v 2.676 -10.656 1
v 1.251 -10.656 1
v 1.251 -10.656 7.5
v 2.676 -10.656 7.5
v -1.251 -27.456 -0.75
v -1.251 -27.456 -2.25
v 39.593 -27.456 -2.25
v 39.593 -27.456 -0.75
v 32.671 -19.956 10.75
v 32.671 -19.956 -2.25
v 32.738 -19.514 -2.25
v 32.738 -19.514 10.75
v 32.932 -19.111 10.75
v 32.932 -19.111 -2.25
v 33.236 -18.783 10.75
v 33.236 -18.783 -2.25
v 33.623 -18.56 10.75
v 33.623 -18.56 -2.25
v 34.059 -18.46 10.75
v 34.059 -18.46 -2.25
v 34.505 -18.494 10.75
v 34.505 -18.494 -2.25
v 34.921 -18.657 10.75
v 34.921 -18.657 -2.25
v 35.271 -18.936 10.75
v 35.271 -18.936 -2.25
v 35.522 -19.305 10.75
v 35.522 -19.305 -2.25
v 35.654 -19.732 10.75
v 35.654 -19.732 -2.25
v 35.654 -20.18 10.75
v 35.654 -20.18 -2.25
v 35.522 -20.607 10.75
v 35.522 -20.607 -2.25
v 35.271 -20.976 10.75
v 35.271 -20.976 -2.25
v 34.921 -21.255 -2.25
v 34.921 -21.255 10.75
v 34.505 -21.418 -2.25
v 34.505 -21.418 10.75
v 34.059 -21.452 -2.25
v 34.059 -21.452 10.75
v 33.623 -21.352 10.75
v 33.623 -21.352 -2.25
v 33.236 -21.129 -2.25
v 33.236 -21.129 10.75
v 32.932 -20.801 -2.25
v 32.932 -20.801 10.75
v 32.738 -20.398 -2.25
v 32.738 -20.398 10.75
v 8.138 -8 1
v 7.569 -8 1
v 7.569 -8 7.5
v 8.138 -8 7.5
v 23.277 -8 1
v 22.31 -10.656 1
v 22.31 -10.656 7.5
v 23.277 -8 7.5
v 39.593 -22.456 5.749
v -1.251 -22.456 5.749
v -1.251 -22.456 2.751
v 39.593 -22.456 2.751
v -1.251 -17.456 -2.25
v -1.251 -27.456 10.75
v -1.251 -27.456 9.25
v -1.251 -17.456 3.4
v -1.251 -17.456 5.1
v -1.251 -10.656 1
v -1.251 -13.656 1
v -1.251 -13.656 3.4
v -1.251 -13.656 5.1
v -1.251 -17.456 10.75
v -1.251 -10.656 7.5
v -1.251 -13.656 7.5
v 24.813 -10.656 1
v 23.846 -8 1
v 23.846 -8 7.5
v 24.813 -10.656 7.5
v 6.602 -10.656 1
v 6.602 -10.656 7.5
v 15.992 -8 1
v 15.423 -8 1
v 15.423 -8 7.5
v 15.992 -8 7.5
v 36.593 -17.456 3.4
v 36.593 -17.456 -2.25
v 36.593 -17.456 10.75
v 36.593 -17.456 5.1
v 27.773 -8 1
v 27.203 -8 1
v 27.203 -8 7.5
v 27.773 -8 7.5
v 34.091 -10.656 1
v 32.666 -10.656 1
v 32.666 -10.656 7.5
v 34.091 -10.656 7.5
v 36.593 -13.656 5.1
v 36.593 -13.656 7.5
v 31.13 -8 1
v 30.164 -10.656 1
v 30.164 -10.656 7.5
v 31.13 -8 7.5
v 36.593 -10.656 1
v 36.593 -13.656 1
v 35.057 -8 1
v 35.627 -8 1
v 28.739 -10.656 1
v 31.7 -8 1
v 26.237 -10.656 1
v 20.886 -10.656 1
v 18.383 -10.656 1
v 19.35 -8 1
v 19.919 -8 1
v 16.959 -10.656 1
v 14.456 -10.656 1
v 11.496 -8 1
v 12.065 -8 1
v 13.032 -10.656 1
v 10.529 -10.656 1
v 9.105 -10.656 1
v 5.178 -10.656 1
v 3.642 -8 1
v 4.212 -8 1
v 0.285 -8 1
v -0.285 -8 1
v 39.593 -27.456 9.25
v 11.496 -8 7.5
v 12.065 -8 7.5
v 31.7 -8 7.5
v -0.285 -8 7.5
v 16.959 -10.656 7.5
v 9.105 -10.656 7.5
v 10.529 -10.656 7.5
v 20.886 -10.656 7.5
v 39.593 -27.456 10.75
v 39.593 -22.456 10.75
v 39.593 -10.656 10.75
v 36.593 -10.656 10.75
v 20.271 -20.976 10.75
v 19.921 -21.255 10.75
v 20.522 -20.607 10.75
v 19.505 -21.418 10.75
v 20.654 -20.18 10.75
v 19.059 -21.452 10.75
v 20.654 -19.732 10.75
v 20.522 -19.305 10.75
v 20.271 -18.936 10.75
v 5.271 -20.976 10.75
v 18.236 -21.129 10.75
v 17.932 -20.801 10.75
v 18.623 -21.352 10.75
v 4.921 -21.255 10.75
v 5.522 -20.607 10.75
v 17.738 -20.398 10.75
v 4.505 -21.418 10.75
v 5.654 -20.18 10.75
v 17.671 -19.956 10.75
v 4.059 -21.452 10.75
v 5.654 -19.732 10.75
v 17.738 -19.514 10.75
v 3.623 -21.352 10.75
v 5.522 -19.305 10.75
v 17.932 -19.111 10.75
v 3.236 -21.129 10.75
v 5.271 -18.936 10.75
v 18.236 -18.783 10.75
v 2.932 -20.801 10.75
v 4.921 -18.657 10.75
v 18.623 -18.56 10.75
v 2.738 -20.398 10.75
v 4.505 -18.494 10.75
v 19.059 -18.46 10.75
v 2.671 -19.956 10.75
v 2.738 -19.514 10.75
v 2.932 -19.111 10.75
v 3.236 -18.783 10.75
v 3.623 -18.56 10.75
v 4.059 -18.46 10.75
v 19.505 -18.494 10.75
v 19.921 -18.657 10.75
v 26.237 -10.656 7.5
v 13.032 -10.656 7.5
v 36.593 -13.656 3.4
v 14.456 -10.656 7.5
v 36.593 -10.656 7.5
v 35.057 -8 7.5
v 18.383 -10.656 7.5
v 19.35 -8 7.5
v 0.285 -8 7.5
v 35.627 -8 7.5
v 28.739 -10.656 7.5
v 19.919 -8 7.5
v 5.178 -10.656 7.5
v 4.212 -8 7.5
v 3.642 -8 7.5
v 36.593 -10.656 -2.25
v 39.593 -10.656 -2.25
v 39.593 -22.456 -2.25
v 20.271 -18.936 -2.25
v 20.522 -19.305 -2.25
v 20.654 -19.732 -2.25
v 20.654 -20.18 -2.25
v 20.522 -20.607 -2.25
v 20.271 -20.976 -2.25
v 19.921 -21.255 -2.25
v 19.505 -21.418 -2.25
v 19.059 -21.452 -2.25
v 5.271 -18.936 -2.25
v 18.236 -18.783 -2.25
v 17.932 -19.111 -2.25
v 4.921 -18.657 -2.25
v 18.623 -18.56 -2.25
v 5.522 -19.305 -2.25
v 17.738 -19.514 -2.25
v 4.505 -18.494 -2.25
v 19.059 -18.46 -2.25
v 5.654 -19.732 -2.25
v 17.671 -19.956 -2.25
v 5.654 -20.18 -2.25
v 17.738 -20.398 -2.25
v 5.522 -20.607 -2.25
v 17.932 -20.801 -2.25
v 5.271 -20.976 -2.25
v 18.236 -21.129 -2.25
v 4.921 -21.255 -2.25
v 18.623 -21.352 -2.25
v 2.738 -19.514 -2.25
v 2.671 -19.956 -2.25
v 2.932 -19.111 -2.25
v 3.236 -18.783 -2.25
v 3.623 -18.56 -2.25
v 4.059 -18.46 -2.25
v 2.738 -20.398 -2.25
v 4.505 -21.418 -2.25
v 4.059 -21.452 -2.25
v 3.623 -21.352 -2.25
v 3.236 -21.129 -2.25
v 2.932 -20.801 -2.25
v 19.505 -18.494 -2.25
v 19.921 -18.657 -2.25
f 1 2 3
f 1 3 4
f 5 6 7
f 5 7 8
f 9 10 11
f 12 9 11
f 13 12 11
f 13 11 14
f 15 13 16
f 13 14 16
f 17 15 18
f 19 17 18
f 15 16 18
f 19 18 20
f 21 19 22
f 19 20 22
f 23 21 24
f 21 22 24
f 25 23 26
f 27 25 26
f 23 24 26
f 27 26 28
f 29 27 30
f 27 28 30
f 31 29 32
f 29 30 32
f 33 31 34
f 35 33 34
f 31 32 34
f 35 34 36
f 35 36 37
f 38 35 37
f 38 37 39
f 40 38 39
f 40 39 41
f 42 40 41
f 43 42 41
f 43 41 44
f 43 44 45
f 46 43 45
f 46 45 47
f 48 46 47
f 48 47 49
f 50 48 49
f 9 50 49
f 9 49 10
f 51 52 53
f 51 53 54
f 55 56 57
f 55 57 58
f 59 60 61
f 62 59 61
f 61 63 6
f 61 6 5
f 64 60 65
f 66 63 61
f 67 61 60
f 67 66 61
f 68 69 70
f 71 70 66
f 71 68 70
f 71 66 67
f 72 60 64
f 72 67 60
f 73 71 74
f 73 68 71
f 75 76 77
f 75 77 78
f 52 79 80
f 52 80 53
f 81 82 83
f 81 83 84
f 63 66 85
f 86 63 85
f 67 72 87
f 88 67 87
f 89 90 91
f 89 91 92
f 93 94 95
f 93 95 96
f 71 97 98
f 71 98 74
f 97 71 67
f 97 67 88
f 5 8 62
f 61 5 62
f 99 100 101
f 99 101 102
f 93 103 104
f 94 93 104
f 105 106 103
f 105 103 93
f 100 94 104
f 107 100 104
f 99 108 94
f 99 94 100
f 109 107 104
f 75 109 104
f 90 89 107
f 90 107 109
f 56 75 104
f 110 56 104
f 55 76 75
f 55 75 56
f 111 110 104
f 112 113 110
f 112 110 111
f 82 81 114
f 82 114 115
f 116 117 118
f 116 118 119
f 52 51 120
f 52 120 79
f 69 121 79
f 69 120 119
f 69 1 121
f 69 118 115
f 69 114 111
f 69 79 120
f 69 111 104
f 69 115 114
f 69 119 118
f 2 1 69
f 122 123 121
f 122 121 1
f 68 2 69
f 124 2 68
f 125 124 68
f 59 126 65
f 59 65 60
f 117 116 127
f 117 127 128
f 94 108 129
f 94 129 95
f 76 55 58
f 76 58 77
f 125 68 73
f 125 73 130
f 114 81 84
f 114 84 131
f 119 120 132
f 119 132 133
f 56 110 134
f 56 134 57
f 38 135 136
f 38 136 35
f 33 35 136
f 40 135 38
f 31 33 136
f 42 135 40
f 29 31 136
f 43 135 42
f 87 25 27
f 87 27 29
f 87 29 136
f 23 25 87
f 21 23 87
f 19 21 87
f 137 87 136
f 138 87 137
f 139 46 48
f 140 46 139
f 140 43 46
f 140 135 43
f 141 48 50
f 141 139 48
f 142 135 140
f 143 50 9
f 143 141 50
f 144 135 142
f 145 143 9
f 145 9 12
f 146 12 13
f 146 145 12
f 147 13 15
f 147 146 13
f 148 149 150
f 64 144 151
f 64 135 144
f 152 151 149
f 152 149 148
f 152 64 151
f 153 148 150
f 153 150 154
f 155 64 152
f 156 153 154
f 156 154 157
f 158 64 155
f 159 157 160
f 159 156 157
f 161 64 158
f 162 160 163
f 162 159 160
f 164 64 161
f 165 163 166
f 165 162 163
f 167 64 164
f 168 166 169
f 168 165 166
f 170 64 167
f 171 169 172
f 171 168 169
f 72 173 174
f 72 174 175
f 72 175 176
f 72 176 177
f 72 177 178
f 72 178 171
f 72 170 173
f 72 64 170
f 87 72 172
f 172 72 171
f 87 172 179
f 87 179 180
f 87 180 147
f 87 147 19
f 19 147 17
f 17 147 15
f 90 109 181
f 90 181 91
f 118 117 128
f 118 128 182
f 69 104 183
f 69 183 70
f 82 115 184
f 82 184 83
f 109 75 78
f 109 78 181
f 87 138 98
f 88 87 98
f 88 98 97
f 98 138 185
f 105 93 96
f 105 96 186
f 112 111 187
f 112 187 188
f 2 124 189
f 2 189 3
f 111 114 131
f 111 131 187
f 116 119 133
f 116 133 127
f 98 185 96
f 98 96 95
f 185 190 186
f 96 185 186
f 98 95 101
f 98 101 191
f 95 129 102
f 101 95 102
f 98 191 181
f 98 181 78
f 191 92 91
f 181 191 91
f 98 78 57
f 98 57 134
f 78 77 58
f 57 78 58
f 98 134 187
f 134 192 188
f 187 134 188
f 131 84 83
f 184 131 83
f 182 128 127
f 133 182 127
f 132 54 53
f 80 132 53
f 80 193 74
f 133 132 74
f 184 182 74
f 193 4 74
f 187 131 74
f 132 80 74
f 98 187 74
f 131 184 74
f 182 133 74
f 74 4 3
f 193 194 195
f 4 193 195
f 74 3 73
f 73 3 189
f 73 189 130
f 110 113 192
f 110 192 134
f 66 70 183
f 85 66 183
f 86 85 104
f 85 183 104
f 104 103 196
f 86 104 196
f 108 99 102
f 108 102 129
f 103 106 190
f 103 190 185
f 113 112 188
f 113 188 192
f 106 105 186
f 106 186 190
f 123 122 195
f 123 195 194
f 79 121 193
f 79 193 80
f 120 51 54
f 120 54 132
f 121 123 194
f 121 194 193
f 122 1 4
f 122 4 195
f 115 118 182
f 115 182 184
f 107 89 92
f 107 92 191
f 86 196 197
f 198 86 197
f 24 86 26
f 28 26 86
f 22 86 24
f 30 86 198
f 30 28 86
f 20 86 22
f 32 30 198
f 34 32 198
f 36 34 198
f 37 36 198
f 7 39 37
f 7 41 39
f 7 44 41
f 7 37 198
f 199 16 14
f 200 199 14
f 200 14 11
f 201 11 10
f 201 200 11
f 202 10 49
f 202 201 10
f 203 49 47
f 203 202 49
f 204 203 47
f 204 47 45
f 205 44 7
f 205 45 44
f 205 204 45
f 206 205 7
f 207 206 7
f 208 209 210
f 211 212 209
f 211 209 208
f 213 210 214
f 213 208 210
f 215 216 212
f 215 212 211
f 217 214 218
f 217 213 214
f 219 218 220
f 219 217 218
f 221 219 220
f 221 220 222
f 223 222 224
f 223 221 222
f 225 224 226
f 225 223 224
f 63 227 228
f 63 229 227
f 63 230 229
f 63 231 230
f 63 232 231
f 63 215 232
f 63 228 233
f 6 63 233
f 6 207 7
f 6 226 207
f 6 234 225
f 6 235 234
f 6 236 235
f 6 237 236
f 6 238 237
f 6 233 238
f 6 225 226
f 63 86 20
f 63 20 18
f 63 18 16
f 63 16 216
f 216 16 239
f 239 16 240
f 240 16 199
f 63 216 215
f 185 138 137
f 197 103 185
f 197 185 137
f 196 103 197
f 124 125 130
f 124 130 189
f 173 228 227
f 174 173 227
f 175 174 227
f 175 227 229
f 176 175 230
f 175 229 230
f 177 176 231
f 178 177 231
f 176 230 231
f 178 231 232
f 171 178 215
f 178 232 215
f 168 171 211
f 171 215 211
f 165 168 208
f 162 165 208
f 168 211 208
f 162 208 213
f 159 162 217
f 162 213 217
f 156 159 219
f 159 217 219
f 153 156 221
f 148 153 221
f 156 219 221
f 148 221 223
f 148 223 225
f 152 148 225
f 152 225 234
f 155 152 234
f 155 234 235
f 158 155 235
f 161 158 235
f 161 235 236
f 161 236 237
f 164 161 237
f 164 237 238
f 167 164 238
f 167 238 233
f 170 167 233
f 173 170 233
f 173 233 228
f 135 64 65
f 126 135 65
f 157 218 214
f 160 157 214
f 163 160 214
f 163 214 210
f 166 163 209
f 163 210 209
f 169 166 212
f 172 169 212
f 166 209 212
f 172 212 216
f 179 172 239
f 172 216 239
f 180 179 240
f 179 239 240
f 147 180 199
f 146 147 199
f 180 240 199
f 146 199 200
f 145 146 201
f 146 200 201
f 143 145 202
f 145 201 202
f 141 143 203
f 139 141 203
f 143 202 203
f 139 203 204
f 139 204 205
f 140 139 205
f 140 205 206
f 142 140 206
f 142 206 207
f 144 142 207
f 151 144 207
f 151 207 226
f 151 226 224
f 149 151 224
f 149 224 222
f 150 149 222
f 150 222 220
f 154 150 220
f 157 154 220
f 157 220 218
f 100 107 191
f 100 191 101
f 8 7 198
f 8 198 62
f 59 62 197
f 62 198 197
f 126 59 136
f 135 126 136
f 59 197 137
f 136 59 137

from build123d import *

# Parameters (mm, degrees)
ESQUISSE1_R             = 2.5
BOSS_EXTRU_1_DEPTH      = 1
BOSS_EXTRU_2_DEPTH      = 6.5
ESQUISSE3_R             = 14.137419556
ENL_V_MAT_EXTRU_1_DEPTH = 1
ESQUISSE4_W             = 37.844594902
ESQUISSE4_H             = 1.7
BOSS_EXTRU_3_DEPTH      = 3.8
ESQUISSE5_W             = 37.844594902
ESQUISSE5_H             = 13
BOSS_EXTRU_4_DEPTH      = 5
ESQUISSE6_W             = 13
ESQUISSE6_H             = 11.8
BOSS_EXTRU_5_DEPTH      = 3
BOSS_EXTRU_6_DEPTH      = 40.844595
ESQUISSE8_R             = 1.5
ENL_V_MAT_EXTRU_2_DEPTH = 14


with BuildPart() as part:
    # Esquisse1 → Boss.-Extru.1 (new body)
    with BuildSketch(Plane.XY):
        with BuildLine():
            ThreePointArc((-2.797532396, 7.349311298), (-3.009326841, 7.265157674), (-3.218593728, 7.174901984))
            ThreePointArc((-3.218593728, 7.174901984), (-3.518823735, 7.161602241), (-3.746621491, 7.357620412))
            ThreePointArc((-3.746621491, 7.357620412), (-4.480939546, 8.300763177), (-5.498824516, 8.927382256))
            ThreePointArc((-5.498824516, 8.927382256), (-5.825153893, 8.717958885), (-6.143516706, 8.496612707))
            ThreePointArc((-6.143516706, 8.496612707), (-5.954123878, 7.316412877), (-5.363784935, 6.277066345))
            ThreePointArc((-5.363784935, 6.277066345), (-5.269862186, 5.991595754), (-5.397042596, 5.719308987))
            ThreePointArc((-5.397042596, 5.719308987), (-5.560510951, 5.560510951), (-5.719308987, 5.397042596))
            ThreePointArc((-5.719308987, 5.397042596), (-5.991595754, 5.269862186), (-6.277066345, 5.363784935))
            ThreePointArc((-6.277066345, 5.363784935), (-7.316412877, 5.954123878), (-8.496612707, 6.143516706))
            ThreePointArc((-8.496612707, 6.143516706), (-8.717958885, 5.825153893), (-8.927382256, 5.498824516))
            ThreePointArc((-8.927382256, 5.498824516), (-8.300763177, 4.480939546), (-7.357620412, 3.746621491))
            ThreePointArc((-7.357620412, 3.746621491), (-7.161602241, 3.518823735), (-7.174901984, 3.218593728))
            ThreePointArc((-7.174901984, 3.218593728), (-7.265157674, 3.009326841), (-7.349311298, 2.797532396))
            ThreePointArc((-7.349311298, 2.797532396), (-7.552201634, 2.575833384), (-7.851884749, 2.553361824))
            ThreePointArc((-7.851884749, 2.553361824), (-9.038028671, 2.701023192), (-10.200868635, 2.424356428))
            ThreePointArc((-10.200868635, 2.424356428), (-10.283533665, 2.045522026), (-10.352134785, 1.663890139))
            ThreePointArc((-10.352134785, 1.663890139), (-9.383686529, 0.963283789), (-8.231324879, 0.645787478))
            ThreePointArc((-8.231324879, 0.645787478), (-7.963053276, 0.510342701), (-7.860447586, 0.22787675))
            ThreePointArc((-7.860447586, 0.22787675), (-7.86375, 0), (-7.860447586, -0.22787675))
            ThreePointArc((-7.860447586, -0.22787675), (-7.963053276, -0.510342701), (-8.231324879, -0.645787478))
            ThreePointArc((-8.231324879, -0.645787478), (-9.383686529, -0.963283789), (-10.352134785, -1.663890139))
            ThreePointArc((-10.352134785, -1.663890139), (-10.283533665, -2.045522026), (-10.200868635, -2.424356428))
            ThreePointArc((-10.200868635, -2.424356428), (-9.038028671, -2.701023192), (-7.851884749, -2.553361824))
            ThreePointArc((-7.851884749, -2.553361824), (-7.552201634, -2.575833384), (-7.349311298, -2.797532396))
            ThreePointArc((-7.349311298, -2.797532396), (-7.265157674, -3.009326841), (-7.174901984, -3.218593728))
            ThreePointArc((-7.174901984, -3.218593728), (-7.161602241, -3.518823735), (-7.357620412, -3.746621491))
            ThreePointArc((-7.357620412, -3.746621491), (-8.300763177, -4.480939546), (-8.927382256, -5.498824516))
            ThreePointArc((-8.927382256, -5.498824516), (-8.717958885, -5.825153893), (-8.496612707, -6.143516706))
            ThreePointArc((-8.496612707, -6.143516706), (-7.316412877, -5.954123878), (-6.277066345, -5.363784935))
            ThreePointArc((-6.277066345, -5.363784935), (-5.991595754, -5.269862186), (-5.719308987, -5.397042596))
            ThreePointArc((-5.719308987, -5.397042596), (-5.560510951, -5.560510951), (-5.397042596, -5.719308987))
            ThreePointArc((-5.397042596, -5.719308987), (-5.269862186, -5.991595754), (-5.363784935, -6.277066345))
            ThreePointArc((-5.363784935, -6.277066345), (-5.954123878, -7.316412877), (-6.143516706, -8.496612707))
            ThreePointArc((-6.143516706, -8.496612707), (-5.825153893, -8.717958885), (-5.498824516, -8.927382256))
            ThreePointArc((-5.498824516, -8.927382256), (-4.480939546, -8.300763177), (-3.746621491, -7.357620412))
            ThreePointArc((-3.746621491, -7.357620412), (-3.518823735, -7.161602241), (-3.218593728, -7.174901984))
            ThreePointArc((-3.218593728, -7.174901984), (-3.009326841, -7.265157674), (-2.797532396, -7.349311298))
            ThreePointArc((-2.797532396, -7.349311298), (-2.575833384, -7.552201634), (-2.553361824, -7.851884749))
            ThreePointArc((-2.553361824, -7.851884749), (-2.701023192, -9.038028671), (-2.424356428, -10.200868635))
            ThreePointArc((-2.424356428, -10.200868635), (-2.045522026, -10.283533665), (-1.663890139, -10.352134785))
            ThreePointArc((-1.663890139, -10.352134785), (-0.963283789, -9.383686529), (-0.645787478, -8.231324879))
            ThreePointArc((-0.645787478, -8.231324879), (-0.510342701, -7.963053276), (-0.22787675, -7.860447586))
            ThreePointArc((-0.22787675, -7.860447586), (0, -7.86375), (0.22787675, -7.860447586))
            ThreePointArc((0.22787675, -7.860447586), (0.510342701, -7.963053276), (0.645787478, -8.231324879))
            ThreePointArc((0.645787478, -8.231324879), (0.963283789, -9.383686529), (1.663890139, -10.352134785))
            ThreePointArc((1.663890139, -10.352134785), (2.045522026, -10.283533665), (2.424356428, -10.200868635))
            ThreePointArc((2.424356428, -10.200868635), (2.701023192, -9.038028671), (2.553361824, -7.851884749))
            ThreePointArc((2.553361824, -7.851884749), (2.575833384, -7.552201634), (2.797532396, -7.349311298))
            ThreePointArc((2.797532396, -7.349311298), (3.009326841, -7.265157674), (3.218593728, -7.174901984))
            ThreePointArc((3.218593728, -7.174901984), (3.518823735, -7.161602241), (3.746621491, -7.357620412))
            ThreePointArc((3.746621491, -7.357620412), (4.480939546, -8.300763177), (5.498824516, -8.927382256))
            ThreePointArc((5.498824516, -8.927382256), (5.825153893, -8.717958885), (6.143516706, -8.496612707))
            ThreePointArc((6.143516706, -8.496612707), (5.954123878, -7.316412877), (5.363784935, -6.277066345))
            ThreePointArc((5.363784935, -6.277066345), (5.269862186, -5.991595754), (5.397042596, -5.719308987))
            ThreePointArc((5.397042596, -5.719308987), (5.560510951, -5.560510951), (5.719308987, -5.397042596))
            ThreePointArc((5.719308987, -5.397042596), (5.991595754, -5.269862186), (6.277066345, -5.363784935))
            ThreePointArc((6.277066345, -5.363784935), (7.316412877, -5.954123878), (8.496612707, -6.143516706))
            ThreePointArc((8.496612707, -6.143516706), (8.717958885, -5.825153893), (8.927382256, -5.498824516))
            ThreePointArc((8.927382256, -5.498824516), (8.300763177, -4.480939546), (7.357620412, -3.746621491))
            ThreePointArc((7.357620412, -3.746621491), (7.161602241, -3.518823735), (7.174901984, -3.218593728))
            ThreePointArc((7.174901984, -3.218593728), (7.265157674, -3.009326841), (7.349311298, -2.797532396))
            ThreePointArc((7.349311298, -2.797532396), (7.552201634, -2.575833384), (7.851884749, -2.553361824))
            ThreePointArc((7.851884749, -2.553361824), (9.038028671, -2.701023192), (10.200868635, -2.424356428))
            ThreePointArc((10.200868635, -2.424356428), (10.283533665, -2.045522026), (10.352134785, -1.663890139))
            ThreePointArc((10.352134785, -1.663890139), (9.383686529, -0.963283789), (8.231324879, -0.645787478))
            ThreePointArc((8.231324879, -0.645787478), (7.963053276, -0.510342701), (7.860447586, -0.22787675))
            ThreePointArc((7.860447586, -0.22787675), (7.86375, 0), (7.860447586, 0.22787675))
            ThreePointArc((7.860447586, 0.22787675), (7.963053276, 0.510342701), (8.231324879, 0.645787478))
            ThreePointArc((8.231324879, 0.645787478), (9.383686529, 0.963283789), (10.352134785, 1.663890139))
            ThreePointArc((10.352134785, 1.663890139), (10.283533665, 2.045522026), (10.200868635, 2.424356428))
            ThreePointArc((10.200868635, 2.424356428), (9.038028671, 2.701023192), (7.851884749, 2.553361824))
            ThreePointArc((7.851884749, 2.553361824), (7.552201634, 2.575833384), (7.349311298, 2.797532396))
            ThreePointArc((7.349311298, 2.797532396), (7.265157674, 3.009326841), (7.174901984, 3.218593728))
            ThreePointArc((7.174901984, 3.218593728), (7.161602241, 3.518823735), (7.357620412, 3.746621491))
            ThreePointArc((7.357620412, 3.746621491), (8.300763177, 4.480939546), (8.927382256, 5.498824516))
            ThreePointArc((8.927382256, 5.498824516), (8.717958885, 5.825153893), (8.496612707, 6.143516706))
            ThreePointArc((8.496612707, 6.143516706), (7.316412877, 5.954123878), (6.277066345, 5.363784935))
            ThreePointArc((6.277066345, 5.363784935), (5.991595754, 5.269862186), (5.719308987, 5.397042596))
            ThreePointArc((5.719308987, 5.397042596), (5.560510951, 5.560510951), (5.397042596, 5.719308987))
            ThreePointArc((5.397042596, 5.719308987), (5.269862186, 5.991595754), (5.363784935, 6.277066345))
            ThreePointArc((5.363784935, 6.277066345), (5.954123878, 7.316412877), (6.143516706, 8.496612707))
            ThreePointArc((6.143516706, 8.496612707), (5.825153893, 8.717958885), (5.498824516, 8.927382256))
            ThreePointArc((5.498824516, 8.927382256), (4.480939546, 8.300763177), (3.746621491, 7.357620412))
            ThreePointArc((3.746621491, 7.357620412), (3.518823735, 7.161602241), (3.218593728, 7.174901984))
            ThreePointArc((3.218593728, 7.174901984), (3.009326841, 7.265157674), (2.797532396, 7.349311298))
            ThreePointArc((2.797532396, 7.349311298), (2.575833384, 7.552201634), (2.553361824, 7.851884749))
            ThreePointArc((2.553361824, 7.851884749), (2.701023192, 9.038028671), (2.424356428, 10.200868635))
            ThreePointArc((2.424356428, 10.200868635), (2.045522026, 10.283533665), (1.663890139, 10.352134785))
            ThreePointArc((1.663890139, 10.352134785), (0.963283789, 9.383686529), (0.645787478, 8.231324879))
            ThreePointArc((0.645787478, 8.231324879), (0.510342701, 7.963053276), (0.22787675, 7.860447586))
            ThreePointArc((0.22787675, 7.860447586), (0, 7.86375), (-0.22787675, 7.860447586))
            ThreePointArc((-0.22787675, 7.860447586), (-0.510342701, 7.963053276), (-0.645787478, 8.231324879))
            ThreePointArc((-0.645787478, 8.231324879), (-0.963283789, 9.383686529), (-1.663890139, 10.352134785))
            ThreePointArc((-1.663890139, 10.352134785), (-2.045522026, 10.283533665), (-2.424356428, 10.200868635))
            ThreePointArc((-2.424356428, 10.200868635), (-2.701023192, 9.038028671), (-2.553361824, 7.851884749))
            ThreePointArc((-2.553361824, 7.851884749), (-2.575833384, 7.552201634), (-2.797532396, 7.349311298))
        make_face()
        Circle(ESQUISSE1_R, mode=Mode.SUBTRACT)
    extrude(amount=BOSS_EXTRU_1_DEPTH)

    # Esquisse2 → Boss.-Extru.2 (add)
    with BuildSketch(Plane.XY.offset(1)):
        Polygon((0.284655009, -8), (1.251359951, -10.656), (2.675515049, -10.656), (3.642219991, -8), (4.211530009, -8), (5.178234951, -10.656), (6.602390049, -10.656), (7.569094991, -8), (8.138405009, -8), (9.105109951, -10.656), (10.529265049, -10.656), (11.495969991, -8), (12.065280009, -8), (13.031984951, -10.656), (14.456140049, -10.656), (15.422844991, -8), (15.992155009, -8), (16.958859951, -10.656), (18.383015049, -10.656), (19.349719991, -8), (19.919030009, -8), (20.885734951, -10.656), (22.309890049, -10.656), (23.276594991, -8), (23.845905009, -8), (24.812609951, -10.656), (26.236765049, -10.656), (27.203469991, -8), (27.772780009, -8), (28.739484951, -10.656), (30.163640049, -10.656), (31.130344991, -8), (31.699655009, -8), (32.666359951, -10.656), (34.090515049, -10.656), (35.057219991, -8), (35.626530009, -8), (36.593234951, -10.656), (36.593234951, -13.656), (-1.251359951, -13.656), (-1.251359951, -10.656), (-0.284655009, -8), align=None)
    extrude(amount=BOSS_EXTRU_2_DEPTH)

    # Esquisse3 → Enlèv. mat.-Extru.1 (cut)
    with BuildSketch(Plane(origin=(0, 0, 0), x_dir=(-1, 0, 0), z_dir=(0, 0, -1))):
        Circle(ESQUISSE3_R)
    extrude(amount=-ENL_V_MAT_EXTRU_1_DEPTH, mode=Mode.SUBTRACT)

    # Esquisse4 → Boss.-Extru.3 (add)
    with BuildSketch(Plane.XZ.offset(13.656)):
        with Locations((17.6709375, 4.25)):
            Rectangle(ESQUISSE4_W, ESQUISSE4_H)
    extrude(amount=BOSS_EXTRU_3_DEPTH)

    # Esquisse5 → Boss.-Extru.4 (add)
    with BuildSketch(Plane.XZ.offset(17.456)):
        with Locations((17.6709375, 4.25)):
            Rectangle(ESQUISSE5_W, ESQUISSE5_H)
    extrude(amount=BOSS_EXTRU_4_DEPTH)

    # Esquisse6 → Boss.-Extru.5 (add)
    with BuildSketch(Plane(origin=(36.593234951, 0, 0), x_dir=(0, 0, -1), z_dir=(1, 0, 0))):
        with Locations((-4.25, -16.556)):
            Rectangle(ESQUISSE6_W, ESQUISSE6_H)
    extrude(amount=BOSS_EXTRU_5_DEPTH)

    # Esquisse7 → Boss.-Extru.6 (add, through all)
    with BuildSketch(Plane.ZY.offset(1.251359951)):
        Polygon((-2.25, -22.456), (-2.25, -27.456), (-0.75, -27.456), (2.751037691, -22.456), align=None)
        Polygon((9.25, -27.456), (5.748962309, -22.456), (10.75, -22.456), (10.75, -27.456), align=None)
    extrude(amount=-BOSS_EXTRU_6_DEPTH)

    # Esquisse8 → Enlèv. mat.-Extru.2 (cut, through all)
    with BuildSketch(Plane(origin=(0, 0, -2.25), x_dir=(-1, 0, 0), z_dir=(0, 0, -1))):
        with Locations((-34.1709375, -19.956)):
            Circle(ESQUISSE8_R)
        with Locations((-4.1709375, -19.956)):
            Circle(ESQUISSE8_R)
        with Locations((-19.1709375, -19.956)):
            Circle(ESQUISSE8_R)
    extrude(amount=-ENL_V_MAT_EXTRU_2_DEPTH, mode=Mode.SUBTRACT)


solid = part.part
